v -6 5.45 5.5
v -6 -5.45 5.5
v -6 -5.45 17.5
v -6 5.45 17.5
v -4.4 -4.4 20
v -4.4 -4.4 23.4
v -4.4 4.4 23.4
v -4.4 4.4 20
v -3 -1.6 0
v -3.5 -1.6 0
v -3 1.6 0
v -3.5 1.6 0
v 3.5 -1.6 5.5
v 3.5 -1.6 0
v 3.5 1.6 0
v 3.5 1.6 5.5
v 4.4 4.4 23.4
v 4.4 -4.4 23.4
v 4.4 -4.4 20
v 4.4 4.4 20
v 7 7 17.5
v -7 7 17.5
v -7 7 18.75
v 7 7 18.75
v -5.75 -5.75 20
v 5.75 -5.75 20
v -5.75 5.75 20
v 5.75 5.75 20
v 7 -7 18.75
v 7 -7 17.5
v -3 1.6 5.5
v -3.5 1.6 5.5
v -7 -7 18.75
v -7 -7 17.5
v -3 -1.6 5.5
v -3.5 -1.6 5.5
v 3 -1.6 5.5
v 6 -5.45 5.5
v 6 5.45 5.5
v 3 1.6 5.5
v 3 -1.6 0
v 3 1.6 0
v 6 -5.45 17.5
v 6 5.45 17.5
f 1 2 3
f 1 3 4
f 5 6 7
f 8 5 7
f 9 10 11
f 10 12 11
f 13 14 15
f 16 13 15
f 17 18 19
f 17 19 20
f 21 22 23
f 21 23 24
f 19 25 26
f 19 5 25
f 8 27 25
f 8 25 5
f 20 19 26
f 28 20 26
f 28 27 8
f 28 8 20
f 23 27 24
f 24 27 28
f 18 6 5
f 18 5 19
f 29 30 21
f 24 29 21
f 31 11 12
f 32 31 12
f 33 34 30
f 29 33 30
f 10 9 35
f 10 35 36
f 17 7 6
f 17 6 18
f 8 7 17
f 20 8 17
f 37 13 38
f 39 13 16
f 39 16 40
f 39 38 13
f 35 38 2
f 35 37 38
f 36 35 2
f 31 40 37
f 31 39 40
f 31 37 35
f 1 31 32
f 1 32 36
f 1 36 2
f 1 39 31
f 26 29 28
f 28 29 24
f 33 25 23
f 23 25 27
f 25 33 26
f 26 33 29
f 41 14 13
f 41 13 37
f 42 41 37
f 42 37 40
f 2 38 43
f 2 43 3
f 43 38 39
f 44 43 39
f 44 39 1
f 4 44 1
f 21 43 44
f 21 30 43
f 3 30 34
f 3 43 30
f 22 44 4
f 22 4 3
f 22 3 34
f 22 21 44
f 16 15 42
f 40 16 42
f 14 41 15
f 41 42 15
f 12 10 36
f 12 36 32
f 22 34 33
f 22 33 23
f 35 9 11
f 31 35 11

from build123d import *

# Parameters (mm, degrees)
SKETCH1_W           = 14
SKETCH1_H           = 14
BOSS_EXTRUDE1_DEPTH = 23.4
SKETCH2_W           = 14
SKETCH2_H           = 14
SKETCH2_W_2         = 8.8
SKETCH2_H_2         = 8.8
CUT_EXTRUDE1_DEPTH  = 3.4
SKETCH3_W           = 14
SKETCH3_H           = 14
SKETCH3_W_2         = 12
SKETCH3_H_2         = 10.9
CUT_EXTRUDE2_DEPTH  = 17.5
SKETCH4_W           = 12
SKETCH4_H           = 10.9
SKETCH4_W_2         = 0.5
SKETCH4_H_2         = 3.2
CUT_EXTRUDE3_DEPTH  = 5.5
CHAMFER1_SIZE       = 1.25


with BuildPart() as part:
    # Sketch1 → Boss-Extrude1 (new body)
    with BuildSketch(Plane.XY):
        Rectangle(SKETCH1_W, SKETCH1_H)
    extrude(amount=BOSS_EXTRUDE1_DEPTH)

    # Sketch2 → Cut-Extrude1 (cut)
    with BuildSketch(Plane.XY.offset(23.4)):
        Rectangle(SKETCH2_W, SKETCH2_H)
        Rectangle(SKETCH2_W_2, SKETCH2_H_2, mode=Mode.SUBTRACT)
    extrude(amount=-CUT_EXTRUDE1_DEPTH, mode=Mode.SUBTRACT)

    # Sketch3 → Cut-Extrude2 (cut)
    with BuildSketch(Plane(origin=(0, 0, 0), x_dir=(-1, 0, 0), z_dir=(0, 0, -1))):
        Rectangle(SKETCH3_W, SKETCH3_H)
        Rectangle(SKETCH3_W_2, SKETCH3_H_2, mode=Mode.SUBTRACT)
    extrude(amount=-CUT_EXTRUDE2_DEPTH, mode=Mode.SUBTRACT)

    # Sketch4 → Cut-Extrude3 (cut)
    with BuildSketch(Plane(origin=(0, 0, 0), x_dir=(-1, 0, 0), z_dir=(0, 0, -1))):
        Rectangle(SKETCH4_W, SKETCH4_H)
        with Locations((-3.25, 0)):
            Rectangle(SKETCH4_W_2, SKETCH4_H_2, mode=Mode.SUBTRACT)
        with Locations((3.25, 0)):
            Rectangle(SKETCH4_W_2, SKETCH4_H_2, mode=Mode.SUBTRACT)
    extrude(amount=-CUT_EXTRUDE3_DEPTH, mode=Mode.SUBTRACT)

    # Chamfer1
    chamfer1_edges = [part.edges().sort_by_distance(p)[0] for p in [
        (-7, 0, 20),
        (0, 7, 20),
        (7, 0, 20),
        (0, -7, 20),
    ]]
    chamfer(chamfer1_edges, length=CHAMFER1_SIZE)


solid = part.part
